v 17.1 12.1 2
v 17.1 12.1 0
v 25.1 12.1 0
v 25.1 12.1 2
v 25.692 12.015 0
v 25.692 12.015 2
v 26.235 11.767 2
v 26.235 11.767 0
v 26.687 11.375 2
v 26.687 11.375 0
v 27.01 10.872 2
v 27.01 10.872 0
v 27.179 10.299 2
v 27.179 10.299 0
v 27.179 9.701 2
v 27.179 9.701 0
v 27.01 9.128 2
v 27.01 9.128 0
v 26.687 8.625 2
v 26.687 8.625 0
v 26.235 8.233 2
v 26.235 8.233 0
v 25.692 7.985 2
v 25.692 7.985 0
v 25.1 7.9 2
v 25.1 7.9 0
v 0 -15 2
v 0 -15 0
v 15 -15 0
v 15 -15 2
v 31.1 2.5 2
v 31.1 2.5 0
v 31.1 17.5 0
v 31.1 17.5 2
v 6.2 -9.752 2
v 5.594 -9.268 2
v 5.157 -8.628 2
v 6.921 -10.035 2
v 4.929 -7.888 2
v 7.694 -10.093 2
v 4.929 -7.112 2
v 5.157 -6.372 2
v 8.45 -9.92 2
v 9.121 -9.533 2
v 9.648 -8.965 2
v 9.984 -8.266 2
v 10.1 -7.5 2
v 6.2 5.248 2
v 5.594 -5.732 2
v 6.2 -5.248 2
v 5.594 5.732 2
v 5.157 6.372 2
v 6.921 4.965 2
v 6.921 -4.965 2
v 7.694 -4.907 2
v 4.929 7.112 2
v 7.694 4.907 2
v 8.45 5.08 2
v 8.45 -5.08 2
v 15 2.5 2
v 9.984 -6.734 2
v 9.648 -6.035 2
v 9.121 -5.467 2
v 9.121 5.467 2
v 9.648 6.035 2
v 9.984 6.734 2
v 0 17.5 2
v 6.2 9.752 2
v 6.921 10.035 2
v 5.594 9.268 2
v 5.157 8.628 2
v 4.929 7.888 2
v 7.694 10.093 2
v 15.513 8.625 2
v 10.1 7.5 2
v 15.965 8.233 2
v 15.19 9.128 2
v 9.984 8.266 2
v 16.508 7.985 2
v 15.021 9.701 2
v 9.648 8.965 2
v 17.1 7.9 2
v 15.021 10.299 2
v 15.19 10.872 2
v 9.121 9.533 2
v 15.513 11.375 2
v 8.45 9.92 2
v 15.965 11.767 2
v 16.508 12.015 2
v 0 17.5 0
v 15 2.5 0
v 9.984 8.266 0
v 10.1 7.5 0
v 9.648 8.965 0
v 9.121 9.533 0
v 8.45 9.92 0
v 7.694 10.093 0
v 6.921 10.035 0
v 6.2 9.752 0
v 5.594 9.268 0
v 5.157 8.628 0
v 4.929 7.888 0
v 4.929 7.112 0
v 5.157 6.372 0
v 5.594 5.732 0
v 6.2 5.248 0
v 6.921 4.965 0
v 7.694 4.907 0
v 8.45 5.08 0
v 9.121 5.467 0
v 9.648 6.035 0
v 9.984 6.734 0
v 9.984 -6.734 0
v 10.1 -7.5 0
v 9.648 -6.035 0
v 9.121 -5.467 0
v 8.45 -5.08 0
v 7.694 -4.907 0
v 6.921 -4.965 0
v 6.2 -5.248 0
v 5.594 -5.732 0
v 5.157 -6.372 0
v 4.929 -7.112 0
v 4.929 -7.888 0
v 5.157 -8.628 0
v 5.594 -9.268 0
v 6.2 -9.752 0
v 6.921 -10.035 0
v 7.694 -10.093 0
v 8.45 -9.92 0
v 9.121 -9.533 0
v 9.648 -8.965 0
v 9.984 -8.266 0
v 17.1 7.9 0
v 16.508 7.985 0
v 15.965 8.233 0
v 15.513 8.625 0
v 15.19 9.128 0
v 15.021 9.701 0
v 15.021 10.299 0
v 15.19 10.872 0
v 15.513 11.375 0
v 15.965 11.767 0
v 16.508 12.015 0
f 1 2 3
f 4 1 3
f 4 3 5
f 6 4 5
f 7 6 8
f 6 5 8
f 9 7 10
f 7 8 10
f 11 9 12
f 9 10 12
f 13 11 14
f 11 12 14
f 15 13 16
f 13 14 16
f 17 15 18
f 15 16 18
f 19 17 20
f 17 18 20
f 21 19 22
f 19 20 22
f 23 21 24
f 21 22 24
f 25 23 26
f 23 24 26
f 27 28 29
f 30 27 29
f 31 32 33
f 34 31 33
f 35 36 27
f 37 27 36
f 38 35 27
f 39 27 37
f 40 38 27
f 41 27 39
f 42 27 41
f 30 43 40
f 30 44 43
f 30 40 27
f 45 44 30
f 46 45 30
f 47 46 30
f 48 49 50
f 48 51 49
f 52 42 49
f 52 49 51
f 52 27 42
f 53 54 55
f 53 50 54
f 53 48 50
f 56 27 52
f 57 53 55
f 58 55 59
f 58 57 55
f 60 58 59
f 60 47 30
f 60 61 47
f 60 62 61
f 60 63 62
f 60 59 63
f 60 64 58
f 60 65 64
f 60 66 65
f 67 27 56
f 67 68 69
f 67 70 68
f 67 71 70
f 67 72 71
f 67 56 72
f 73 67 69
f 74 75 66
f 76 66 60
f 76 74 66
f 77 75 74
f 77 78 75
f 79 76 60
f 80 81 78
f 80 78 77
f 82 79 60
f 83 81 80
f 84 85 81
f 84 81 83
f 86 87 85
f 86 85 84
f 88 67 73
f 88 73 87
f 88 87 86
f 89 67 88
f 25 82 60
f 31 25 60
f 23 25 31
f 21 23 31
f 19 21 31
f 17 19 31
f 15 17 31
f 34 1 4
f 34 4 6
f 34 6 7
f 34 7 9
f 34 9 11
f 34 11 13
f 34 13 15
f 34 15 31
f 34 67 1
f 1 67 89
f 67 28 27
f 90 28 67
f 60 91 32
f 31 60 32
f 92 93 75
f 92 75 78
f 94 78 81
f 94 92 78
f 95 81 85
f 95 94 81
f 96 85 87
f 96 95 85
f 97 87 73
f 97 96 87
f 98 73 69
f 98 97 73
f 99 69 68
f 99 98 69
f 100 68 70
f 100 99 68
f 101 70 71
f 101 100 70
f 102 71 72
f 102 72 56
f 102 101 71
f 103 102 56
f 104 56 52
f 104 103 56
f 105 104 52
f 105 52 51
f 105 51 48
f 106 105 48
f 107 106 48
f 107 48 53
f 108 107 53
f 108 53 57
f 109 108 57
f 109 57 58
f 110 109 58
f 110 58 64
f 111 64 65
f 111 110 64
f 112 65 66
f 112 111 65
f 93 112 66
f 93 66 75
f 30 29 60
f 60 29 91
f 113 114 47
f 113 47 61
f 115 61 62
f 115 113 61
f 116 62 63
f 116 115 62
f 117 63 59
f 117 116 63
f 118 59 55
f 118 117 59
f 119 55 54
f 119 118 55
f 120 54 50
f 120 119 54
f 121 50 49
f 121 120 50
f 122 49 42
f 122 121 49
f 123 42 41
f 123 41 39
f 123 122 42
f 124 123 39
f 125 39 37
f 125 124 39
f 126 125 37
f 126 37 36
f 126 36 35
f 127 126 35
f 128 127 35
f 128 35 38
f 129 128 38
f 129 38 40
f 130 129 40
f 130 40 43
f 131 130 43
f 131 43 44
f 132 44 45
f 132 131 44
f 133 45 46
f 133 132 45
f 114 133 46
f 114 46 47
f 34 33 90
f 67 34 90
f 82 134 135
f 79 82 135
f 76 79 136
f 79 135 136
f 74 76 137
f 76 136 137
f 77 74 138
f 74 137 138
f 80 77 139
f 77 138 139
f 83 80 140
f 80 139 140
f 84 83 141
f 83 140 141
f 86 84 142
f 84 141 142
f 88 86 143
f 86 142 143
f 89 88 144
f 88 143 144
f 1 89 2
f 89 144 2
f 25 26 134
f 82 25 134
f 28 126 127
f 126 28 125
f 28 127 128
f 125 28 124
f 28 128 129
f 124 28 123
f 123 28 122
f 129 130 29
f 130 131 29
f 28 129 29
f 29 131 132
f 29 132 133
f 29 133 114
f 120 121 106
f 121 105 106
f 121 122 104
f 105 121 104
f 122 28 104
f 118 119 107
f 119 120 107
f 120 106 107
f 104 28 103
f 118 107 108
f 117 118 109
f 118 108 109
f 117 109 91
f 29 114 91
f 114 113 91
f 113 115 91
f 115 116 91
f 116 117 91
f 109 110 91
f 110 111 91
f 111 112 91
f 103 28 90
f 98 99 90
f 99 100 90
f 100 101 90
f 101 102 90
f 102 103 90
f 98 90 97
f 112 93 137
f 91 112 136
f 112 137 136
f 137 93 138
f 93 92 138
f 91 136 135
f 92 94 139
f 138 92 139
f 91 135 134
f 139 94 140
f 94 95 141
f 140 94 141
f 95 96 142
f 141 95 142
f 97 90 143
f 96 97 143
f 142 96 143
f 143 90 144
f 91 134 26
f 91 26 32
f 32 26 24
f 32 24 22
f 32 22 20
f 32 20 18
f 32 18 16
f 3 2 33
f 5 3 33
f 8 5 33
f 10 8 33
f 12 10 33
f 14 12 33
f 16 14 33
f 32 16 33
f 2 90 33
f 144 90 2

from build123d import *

# Parameters (mm, degrees)
SKETCH_1_R      = 2.6
SKETCH_1_W      = 15
SKETCH_1_H      = 15
EXTRUDE_1_DEPTH = 2


with BuildPart() as part:
    # 草图1 → 凸台-拉伸1 (new body)
    # profile 1 of 2: a face of its own
    with BuildSketch(Plane.XY):
        Polygon((0, 17.5), (0, 0), (15, 0), (15, 2.5), (31.1, 2.5), (31.1, 17.5), align=None)
        with Locations((7.5, 7.5)):
            Circle(SKETCH_1_R, mode=Mode.SUBTRACT)
        with BuildLine():
            ThreePointArc((17.1, 7.9), (15, 10), (17.1, 12.1))
            Line((17.1, 12.1), (25.1, 12.1))
            ThreePointArc((25.1, 12.1), (27.2, 10), (25.1, 7.9))
            Line((25.1, 7.9), (17.1, 7.9))
        make_face(mode=Mode.SUBTRACT)
    # profile 2 of 2: a face of its own
    with BuildSketch(Plane.XY):
        with Locations((7.5, -7.5)):
            Rectangle(SKETCH_1_W, SKETCH_1_H)
        with Locations((7.5, -7.5)):
            Circle(SKETCH_1_R, mode=Mode.SUBTRACT)
    extrude(amount=EXTRUDE_1_DEPTH)


solid = part.part
